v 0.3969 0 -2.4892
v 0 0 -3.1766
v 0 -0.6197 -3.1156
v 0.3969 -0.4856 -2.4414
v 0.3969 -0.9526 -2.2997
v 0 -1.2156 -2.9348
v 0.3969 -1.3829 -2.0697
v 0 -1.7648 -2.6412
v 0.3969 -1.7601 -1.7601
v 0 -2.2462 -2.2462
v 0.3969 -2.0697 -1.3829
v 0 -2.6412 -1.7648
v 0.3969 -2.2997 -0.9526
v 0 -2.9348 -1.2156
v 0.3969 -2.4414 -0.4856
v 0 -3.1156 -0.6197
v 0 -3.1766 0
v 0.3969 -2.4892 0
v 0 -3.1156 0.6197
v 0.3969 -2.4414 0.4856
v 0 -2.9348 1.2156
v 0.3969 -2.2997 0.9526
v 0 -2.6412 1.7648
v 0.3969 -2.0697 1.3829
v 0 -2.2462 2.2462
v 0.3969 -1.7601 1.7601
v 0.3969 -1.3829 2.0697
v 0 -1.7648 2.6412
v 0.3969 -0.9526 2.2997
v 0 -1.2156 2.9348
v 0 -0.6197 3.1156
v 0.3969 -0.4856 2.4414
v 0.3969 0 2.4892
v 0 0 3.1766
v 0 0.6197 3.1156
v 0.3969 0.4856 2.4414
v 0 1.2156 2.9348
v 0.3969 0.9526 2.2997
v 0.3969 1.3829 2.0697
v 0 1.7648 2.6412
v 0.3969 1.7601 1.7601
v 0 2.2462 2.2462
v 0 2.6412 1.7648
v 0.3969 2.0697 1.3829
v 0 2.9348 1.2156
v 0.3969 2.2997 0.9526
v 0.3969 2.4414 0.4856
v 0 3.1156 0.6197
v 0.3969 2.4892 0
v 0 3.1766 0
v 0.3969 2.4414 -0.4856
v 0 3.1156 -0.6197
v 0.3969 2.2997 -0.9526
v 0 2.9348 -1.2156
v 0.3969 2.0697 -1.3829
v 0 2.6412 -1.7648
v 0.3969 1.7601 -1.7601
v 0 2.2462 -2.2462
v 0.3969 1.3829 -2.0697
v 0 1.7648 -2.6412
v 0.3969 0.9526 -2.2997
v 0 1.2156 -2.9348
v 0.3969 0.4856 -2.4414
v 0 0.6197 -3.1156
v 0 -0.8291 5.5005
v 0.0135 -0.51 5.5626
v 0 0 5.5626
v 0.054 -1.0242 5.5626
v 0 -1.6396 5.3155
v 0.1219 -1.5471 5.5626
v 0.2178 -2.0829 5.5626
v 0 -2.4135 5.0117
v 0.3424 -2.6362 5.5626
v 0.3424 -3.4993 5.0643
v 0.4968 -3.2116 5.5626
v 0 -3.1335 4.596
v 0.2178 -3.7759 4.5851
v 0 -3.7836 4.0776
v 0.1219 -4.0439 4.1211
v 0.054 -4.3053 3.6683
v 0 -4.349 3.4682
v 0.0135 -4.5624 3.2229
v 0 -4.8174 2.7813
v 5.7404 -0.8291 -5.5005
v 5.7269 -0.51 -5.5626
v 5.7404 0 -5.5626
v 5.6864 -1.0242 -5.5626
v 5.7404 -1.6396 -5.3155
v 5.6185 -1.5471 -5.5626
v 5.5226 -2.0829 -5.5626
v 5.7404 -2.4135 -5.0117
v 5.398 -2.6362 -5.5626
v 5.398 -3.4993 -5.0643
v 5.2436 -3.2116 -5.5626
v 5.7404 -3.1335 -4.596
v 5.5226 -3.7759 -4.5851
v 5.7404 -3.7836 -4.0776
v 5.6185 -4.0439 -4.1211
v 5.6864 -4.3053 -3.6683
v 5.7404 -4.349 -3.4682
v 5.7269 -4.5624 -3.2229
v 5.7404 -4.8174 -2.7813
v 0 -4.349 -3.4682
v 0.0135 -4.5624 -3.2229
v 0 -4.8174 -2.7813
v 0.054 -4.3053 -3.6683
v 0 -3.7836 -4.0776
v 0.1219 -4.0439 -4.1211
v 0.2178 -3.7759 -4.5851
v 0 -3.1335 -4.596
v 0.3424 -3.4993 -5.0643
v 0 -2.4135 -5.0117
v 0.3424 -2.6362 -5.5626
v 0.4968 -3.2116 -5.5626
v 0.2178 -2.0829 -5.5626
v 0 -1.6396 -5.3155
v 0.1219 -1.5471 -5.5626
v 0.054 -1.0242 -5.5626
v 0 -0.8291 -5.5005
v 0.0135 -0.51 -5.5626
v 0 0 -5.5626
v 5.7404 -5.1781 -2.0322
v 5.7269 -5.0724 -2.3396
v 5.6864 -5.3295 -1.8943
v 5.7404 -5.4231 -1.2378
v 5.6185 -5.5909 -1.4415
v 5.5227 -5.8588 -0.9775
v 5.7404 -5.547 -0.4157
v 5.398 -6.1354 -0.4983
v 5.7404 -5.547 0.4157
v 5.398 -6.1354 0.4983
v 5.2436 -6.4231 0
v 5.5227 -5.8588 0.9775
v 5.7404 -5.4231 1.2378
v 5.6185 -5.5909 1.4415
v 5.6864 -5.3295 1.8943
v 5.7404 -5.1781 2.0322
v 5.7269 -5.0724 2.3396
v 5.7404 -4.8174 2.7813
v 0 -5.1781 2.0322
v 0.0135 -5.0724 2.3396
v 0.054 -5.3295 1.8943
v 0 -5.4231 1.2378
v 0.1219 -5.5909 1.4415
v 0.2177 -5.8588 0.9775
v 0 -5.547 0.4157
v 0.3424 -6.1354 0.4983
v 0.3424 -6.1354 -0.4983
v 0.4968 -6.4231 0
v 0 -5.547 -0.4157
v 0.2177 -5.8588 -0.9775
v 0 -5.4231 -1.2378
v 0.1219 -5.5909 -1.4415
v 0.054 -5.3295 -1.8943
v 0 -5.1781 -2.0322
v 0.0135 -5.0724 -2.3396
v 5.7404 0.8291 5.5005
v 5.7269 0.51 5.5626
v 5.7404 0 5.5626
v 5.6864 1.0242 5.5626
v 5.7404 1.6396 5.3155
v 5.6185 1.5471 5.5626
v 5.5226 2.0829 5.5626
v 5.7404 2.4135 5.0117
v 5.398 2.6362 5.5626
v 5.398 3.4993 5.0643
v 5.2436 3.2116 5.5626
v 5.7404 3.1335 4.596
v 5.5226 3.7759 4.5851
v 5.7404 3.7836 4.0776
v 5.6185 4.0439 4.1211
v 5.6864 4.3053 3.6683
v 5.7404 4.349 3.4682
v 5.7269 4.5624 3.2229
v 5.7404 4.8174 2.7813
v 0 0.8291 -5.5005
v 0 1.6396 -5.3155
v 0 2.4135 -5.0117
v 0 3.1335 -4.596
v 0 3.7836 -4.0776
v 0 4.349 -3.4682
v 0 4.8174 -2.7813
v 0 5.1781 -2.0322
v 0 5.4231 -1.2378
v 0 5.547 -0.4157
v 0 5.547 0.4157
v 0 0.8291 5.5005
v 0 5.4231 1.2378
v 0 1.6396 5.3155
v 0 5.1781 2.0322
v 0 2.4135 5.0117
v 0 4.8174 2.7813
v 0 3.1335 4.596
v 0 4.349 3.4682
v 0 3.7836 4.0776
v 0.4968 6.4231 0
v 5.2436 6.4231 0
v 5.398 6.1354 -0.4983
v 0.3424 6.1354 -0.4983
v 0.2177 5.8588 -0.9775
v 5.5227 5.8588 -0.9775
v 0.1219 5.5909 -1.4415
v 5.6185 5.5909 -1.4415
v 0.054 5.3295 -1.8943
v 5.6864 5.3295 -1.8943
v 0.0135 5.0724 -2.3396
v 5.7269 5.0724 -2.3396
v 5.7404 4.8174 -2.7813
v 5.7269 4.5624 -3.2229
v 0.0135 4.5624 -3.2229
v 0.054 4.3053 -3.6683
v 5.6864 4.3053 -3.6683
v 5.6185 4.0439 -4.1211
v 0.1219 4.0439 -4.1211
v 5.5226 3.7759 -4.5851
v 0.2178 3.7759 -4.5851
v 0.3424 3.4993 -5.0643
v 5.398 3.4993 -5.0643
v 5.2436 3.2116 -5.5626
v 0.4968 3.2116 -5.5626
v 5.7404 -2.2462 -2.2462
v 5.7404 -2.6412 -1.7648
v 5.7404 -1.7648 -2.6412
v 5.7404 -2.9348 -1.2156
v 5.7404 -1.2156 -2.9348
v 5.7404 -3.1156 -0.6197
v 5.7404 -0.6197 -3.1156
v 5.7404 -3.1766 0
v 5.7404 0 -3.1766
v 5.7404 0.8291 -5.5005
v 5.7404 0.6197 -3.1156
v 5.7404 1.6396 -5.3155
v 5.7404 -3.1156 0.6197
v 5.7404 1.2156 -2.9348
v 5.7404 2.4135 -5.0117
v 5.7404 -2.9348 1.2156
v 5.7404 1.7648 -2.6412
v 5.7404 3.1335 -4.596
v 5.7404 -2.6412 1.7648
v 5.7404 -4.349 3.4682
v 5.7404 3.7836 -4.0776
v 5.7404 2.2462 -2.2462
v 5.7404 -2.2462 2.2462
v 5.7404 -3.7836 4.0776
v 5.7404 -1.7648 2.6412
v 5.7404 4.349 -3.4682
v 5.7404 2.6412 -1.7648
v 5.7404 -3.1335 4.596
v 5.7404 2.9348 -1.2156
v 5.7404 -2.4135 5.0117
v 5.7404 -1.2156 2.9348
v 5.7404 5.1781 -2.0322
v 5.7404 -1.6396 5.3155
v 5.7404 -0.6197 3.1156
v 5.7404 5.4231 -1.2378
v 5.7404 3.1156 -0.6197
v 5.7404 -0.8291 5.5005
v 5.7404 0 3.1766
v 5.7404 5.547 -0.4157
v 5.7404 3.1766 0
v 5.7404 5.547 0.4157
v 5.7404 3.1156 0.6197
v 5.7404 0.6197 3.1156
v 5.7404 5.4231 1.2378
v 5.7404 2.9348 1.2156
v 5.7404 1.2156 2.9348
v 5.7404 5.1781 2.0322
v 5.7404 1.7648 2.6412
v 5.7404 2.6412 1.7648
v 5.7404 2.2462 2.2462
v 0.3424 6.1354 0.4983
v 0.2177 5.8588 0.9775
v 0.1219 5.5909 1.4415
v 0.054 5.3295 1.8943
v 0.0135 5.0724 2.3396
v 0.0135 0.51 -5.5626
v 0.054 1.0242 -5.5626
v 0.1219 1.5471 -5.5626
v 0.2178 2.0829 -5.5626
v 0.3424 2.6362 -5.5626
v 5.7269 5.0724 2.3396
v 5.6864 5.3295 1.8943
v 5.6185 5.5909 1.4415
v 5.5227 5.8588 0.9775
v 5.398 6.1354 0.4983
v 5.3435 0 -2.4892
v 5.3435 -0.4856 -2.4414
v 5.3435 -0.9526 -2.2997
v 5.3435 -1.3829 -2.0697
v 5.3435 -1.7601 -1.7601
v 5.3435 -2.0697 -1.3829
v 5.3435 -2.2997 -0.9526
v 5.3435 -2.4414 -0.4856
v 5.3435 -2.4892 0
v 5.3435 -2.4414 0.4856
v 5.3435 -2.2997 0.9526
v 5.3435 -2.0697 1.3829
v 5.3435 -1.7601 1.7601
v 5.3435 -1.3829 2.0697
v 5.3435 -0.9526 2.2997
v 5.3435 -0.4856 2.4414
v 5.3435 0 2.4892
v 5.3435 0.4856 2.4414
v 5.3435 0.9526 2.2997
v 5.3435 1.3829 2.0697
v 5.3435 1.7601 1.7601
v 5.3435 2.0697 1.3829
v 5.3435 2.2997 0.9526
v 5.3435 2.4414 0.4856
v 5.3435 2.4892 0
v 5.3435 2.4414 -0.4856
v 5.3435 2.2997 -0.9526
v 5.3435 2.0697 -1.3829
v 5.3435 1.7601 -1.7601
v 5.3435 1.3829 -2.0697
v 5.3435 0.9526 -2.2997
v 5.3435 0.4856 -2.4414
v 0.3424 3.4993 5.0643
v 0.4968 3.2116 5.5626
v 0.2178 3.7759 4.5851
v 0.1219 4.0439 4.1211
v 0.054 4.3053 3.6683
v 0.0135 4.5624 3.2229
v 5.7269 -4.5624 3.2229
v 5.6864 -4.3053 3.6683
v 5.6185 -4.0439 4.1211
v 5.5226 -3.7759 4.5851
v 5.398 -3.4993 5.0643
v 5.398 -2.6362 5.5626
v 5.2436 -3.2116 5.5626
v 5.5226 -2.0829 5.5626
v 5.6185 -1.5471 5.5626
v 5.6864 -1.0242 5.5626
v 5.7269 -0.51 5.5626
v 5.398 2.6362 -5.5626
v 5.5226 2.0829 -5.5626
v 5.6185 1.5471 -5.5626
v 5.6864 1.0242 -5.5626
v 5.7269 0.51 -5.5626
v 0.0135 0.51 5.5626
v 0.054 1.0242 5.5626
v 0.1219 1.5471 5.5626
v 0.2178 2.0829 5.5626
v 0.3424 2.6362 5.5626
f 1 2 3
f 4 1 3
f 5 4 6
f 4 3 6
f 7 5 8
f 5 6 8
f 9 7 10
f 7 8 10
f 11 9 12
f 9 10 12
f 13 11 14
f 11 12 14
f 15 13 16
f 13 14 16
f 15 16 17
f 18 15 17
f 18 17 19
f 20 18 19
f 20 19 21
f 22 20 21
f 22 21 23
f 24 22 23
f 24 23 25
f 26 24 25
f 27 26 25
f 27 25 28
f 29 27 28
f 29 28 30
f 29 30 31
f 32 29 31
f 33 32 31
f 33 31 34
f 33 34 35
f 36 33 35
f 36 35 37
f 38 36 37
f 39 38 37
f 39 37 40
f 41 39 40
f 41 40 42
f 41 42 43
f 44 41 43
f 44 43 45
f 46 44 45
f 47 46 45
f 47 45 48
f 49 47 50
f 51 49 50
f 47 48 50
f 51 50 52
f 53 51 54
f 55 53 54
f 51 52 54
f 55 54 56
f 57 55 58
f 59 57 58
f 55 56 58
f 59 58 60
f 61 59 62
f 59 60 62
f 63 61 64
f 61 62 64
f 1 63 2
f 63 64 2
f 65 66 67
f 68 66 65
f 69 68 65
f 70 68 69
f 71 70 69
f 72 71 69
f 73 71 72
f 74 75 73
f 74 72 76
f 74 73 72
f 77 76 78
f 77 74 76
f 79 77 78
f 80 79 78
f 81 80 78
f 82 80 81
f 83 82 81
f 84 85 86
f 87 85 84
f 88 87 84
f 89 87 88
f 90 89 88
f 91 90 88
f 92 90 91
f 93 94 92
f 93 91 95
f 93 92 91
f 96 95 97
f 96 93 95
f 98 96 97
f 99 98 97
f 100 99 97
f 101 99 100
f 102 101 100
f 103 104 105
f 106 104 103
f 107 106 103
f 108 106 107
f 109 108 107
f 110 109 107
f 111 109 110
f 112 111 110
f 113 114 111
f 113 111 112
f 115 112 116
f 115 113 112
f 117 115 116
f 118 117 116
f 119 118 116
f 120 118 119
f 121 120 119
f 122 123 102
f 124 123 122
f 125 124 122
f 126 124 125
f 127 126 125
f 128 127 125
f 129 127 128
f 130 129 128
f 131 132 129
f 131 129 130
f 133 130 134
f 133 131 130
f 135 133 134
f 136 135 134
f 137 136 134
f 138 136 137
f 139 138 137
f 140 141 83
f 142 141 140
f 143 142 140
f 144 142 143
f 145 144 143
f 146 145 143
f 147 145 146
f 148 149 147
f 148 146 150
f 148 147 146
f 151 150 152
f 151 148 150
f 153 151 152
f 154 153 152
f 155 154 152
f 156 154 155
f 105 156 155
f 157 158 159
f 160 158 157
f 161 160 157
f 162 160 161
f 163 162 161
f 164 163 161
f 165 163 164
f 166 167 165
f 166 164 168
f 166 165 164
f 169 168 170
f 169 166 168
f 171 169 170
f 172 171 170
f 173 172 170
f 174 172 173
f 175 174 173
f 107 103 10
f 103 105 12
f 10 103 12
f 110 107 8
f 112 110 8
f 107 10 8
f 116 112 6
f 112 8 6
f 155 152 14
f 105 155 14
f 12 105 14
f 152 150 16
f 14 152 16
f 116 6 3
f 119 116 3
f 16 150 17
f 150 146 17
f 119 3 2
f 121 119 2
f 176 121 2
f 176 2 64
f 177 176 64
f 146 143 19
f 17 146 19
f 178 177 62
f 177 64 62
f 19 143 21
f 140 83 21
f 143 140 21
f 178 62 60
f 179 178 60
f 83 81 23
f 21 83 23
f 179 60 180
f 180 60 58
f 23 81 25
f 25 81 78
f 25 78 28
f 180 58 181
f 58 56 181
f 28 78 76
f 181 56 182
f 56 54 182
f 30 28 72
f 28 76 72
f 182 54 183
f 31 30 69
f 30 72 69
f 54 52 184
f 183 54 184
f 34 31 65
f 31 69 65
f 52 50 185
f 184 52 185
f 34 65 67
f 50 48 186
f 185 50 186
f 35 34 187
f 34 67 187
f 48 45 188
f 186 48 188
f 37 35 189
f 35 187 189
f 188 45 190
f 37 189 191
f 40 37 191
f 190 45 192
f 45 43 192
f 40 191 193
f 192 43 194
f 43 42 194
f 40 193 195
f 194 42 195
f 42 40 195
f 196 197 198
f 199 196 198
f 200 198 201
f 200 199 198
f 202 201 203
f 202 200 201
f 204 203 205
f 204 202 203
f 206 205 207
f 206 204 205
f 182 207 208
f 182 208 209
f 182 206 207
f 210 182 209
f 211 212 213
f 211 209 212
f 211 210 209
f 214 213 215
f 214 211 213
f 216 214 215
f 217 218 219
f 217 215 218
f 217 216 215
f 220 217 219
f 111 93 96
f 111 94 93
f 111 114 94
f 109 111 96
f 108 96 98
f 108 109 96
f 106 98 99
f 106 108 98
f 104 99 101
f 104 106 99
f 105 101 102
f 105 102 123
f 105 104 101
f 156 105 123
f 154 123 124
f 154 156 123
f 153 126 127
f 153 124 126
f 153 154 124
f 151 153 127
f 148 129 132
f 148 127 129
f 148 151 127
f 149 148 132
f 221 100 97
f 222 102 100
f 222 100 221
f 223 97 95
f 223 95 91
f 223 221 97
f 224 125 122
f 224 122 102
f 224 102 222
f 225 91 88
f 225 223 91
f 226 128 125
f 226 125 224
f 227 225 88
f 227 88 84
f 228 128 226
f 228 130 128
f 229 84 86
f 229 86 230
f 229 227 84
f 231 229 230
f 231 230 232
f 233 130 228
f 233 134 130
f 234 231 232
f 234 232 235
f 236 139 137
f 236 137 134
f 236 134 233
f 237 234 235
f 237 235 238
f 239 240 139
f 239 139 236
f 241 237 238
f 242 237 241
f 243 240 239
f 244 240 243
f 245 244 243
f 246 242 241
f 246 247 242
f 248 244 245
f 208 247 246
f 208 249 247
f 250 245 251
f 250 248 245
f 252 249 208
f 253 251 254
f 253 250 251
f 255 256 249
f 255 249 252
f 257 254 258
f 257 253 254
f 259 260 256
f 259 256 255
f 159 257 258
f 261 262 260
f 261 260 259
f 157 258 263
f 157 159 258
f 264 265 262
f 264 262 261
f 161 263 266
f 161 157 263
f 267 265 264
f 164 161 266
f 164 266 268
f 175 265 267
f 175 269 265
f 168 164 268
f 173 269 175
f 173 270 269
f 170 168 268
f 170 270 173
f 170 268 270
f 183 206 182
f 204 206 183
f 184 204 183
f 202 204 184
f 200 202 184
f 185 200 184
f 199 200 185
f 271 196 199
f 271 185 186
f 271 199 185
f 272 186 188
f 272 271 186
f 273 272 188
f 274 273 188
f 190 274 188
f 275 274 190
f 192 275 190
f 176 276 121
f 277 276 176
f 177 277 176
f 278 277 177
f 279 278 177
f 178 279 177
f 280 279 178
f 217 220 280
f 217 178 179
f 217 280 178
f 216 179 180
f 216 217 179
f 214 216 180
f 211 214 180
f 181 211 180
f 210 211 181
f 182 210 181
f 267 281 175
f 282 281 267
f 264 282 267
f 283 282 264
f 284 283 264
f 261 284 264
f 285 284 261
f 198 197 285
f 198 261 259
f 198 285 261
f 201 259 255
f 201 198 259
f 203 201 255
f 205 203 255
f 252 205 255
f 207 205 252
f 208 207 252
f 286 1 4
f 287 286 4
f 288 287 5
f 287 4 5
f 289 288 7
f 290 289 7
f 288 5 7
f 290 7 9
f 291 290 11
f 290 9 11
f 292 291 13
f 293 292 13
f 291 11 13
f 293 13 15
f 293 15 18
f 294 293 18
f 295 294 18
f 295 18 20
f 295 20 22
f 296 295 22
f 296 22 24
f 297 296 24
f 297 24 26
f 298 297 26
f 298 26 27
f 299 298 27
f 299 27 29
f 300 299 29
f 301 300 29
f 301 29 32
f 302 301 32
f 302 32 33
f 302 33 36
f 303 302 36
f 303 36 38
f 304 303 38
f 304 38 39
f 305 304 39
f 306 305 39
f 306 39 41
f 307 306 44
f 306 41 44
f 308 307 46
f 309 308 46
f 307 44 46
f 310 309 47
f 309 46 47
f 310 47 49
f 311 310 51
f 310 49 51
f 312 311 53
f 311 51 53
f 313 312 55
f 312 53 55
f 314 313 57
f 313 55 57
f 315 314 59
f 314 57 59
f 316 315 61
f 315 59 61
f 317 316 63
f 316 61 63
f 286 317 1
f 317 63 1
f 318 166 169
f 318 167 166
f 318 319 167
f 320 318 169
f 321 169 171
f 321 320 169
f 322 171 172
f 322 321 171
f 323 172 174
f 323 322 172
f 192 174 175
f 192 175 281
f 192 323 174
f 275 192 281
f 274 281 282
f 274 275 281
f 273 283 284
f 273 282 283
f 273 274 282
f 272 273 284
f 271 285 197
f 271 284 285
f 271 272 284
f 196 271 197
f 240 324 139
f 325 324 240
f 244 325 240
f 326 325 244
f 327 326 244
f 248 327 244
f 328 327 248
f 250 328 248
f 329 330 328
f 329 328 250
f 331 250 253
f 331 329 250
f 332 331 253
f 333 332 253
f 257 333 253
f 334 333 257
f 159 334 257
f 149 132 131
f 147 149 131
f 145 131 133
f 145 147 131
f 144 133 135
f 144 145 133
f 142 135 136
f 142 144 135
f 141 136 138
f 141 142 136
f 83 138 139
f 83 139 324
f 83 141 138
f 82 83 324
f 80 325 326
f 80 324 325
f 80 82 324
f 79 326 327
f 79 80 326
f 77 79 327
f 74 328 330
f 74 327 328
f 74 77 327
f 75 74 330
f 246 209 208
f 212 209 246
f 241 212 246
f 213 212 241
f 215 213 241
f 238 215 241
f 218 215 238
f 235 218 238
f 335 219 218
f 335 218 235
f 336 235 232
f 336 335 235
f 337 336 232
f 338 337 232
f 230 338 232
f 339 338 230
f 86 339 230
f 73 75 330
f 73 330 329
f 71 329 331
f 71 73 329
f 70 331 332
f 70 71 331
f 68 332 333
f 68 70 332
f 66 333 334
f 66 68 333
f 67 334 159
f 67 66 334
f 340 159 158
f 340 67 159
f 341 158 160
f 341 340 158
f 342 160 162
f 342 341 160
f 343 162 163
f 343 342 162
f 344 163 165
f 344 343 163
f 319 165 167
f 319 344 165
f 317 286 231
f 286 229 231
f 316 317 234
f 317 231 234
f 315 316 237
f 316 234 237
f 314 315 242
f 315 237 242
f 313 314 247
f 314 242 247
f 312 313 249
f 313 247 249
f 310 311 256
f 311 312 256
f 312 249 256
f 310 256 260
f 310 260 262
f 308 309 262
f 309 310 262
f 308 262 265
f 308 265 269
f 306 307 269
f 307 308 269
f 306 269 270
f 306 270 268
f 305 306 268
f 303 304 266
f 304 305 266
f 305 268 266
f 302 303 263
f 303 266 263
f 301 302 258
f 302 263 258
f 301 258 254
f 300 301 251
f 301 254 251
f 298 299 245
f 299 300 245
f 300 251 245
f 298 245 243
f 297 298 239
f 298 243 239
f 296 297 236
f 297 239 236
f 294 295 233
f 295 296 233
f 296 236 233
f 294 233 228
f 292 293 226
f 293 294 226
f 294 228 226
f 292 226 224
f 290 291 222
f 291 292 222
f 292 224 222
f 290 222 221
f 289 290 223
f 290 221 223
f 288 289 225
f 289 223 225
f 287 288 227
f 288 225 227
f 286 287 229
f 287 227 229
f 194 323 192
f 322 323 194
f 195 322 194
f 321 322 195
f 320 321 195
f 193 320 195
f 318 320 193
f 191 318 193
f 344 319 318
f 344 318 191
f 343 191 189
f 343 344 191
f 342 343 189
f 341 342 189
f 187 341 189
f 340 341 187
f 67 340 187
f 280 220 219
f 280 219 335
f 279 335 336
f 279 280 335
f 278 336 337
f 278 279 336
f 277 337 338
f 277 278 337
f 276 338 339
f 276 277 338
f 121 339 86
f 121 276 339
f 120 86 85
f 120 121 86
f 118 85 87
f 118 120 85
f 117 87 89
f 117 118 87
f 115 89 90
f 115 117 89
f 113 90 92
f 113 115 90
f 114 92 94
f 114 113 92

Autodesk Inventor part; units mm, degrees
ref_plane "YZ Plane" through (0, 0, 0) normal (1, 0, 0) x (0, 1, 0)
ref_plane "XZ Plane" through (0, 0, 0) normal (0, 1, 0) x (-1, 0, 0)
sketch "Sketch1" plane through (0, 0, 0) normal (1, 0, 0) x (0, 1, 0)
  line L0 (-6.4231, 0) -> (-3.2116, 5.5626)
  line L1 (-3.2116, 5.5626) -> (3.2116, 5.5626)
  line L2 (3.2116, 5.5626) -> (6.4231, 0)
  line L3 (6.4231, 0) -> (3.2116, -5.5626)
  line L4 (3.2116, -5.5626) -> (-3.2116, -5.5626)
  line L5 (-3.2116, -5.5626) -> (-6.4231, 0)
  point P0 (0, 0)
  point P1 (0, 0)
  dimension "d0" = 12.8463
extrude "Body" add sketch "Sketch1" along normal blind 5.7404
sketch "Sketch2" plane through (0, 0, 0) normal (0, 0, 1) x (1, 0, 0)
  line L0 (0, 3.2116) -> (0, 6.4231) projected
  line L1 (0, 6.4231) -> (5.7404, 6.4231) projected
  line L2 (5.7404, 3.2116) -> (5.7404, 6.4231) projected
  line L3 (-1.1481, 0) -> (6.8885, 0) projected
  line L4 (0.4968, 6.4231) -> (0, 5.5626)
  line L5 (5.2436, 6.4231) -> (5.7404, 5.5626)
  dimension "d3" = 30
  dimension "d4" = 30
  dimension "d5" = 11.1252
  dimension "d6" = 11.1252
revolve "Chamfer1" cut sketch "Sketch2" angle 360 about axis through (-10, 0, 0) along (1, 0, 0)
sketch "Sketch3" plane through (5.7404, 0, 0) normal (1, 0, 0) x (0, 0, -1)
  arc A0 (-2.7813, -4.8174) -> (2.7813, -4.8174) centre (0, 0) ccw projected
hole "Thread" at (5.7404, 0, 0) direction (-1, 0, 0) diameter 4.9784 end through all thread size "1/4-20 UNC" class "2B" standard "ANSI Unified Screw Threads"
chamfer "Chamfer2" distance 0.6874 angle 30 1 edges at (5.7404, 0, 2.4892) measured on face at (5.7404, -4.5118, -0.1)
chamfer "Chamfer3" distance 0.6874 angle 30 1 edges at (0, 0, 2.4892) measured on face at (0, -4.5118, -0.1)
ref_plane "Work Plane1" through (-12.197, 0, 0) normal (0, -0.8660254, -0.5) x (1, 0, 0)
equation "\"d0\" = 1.1547 * SW"
equation "\"d1\" = KOH"
equation "\"d3\" = ANG1"
equation "\"d4\" = ANG2"
equation "\"d5\" = SW0"
equation "\"d6\" = SW01"
equation "\"d8\" = -0.5 * GD1 + 0.5 * NND"
equation "\"d40\" = -0.5 * GD1 + 0.5 * NND"
equation "\"d10\" = -0.5 * GD1 + 0.5 * NND"
equation "\"d41\" = -0.5 * GD1 + 0.5 * NND"
equation "\"ANG1\" = 30deg"
equation "\"ANG2\" = 30deg"
equation "\"NND\" = 6.35"
equation "\"KOH\" = 5.7404"
equation "\"SW\" = 11.1252"
equation "\"SW0\" = SW"
equation "\"SW01\" = SW"
equation "\"THREADDIA\" = 6.35"
equation "\"TOA\" = 30deg"
equation "\"E0\" = 1.155 * SW"
equation "\"GD1\" = 4.975185"
properties part number "AS 2465 - 1/4  UNC" material "Steel, Mild"
